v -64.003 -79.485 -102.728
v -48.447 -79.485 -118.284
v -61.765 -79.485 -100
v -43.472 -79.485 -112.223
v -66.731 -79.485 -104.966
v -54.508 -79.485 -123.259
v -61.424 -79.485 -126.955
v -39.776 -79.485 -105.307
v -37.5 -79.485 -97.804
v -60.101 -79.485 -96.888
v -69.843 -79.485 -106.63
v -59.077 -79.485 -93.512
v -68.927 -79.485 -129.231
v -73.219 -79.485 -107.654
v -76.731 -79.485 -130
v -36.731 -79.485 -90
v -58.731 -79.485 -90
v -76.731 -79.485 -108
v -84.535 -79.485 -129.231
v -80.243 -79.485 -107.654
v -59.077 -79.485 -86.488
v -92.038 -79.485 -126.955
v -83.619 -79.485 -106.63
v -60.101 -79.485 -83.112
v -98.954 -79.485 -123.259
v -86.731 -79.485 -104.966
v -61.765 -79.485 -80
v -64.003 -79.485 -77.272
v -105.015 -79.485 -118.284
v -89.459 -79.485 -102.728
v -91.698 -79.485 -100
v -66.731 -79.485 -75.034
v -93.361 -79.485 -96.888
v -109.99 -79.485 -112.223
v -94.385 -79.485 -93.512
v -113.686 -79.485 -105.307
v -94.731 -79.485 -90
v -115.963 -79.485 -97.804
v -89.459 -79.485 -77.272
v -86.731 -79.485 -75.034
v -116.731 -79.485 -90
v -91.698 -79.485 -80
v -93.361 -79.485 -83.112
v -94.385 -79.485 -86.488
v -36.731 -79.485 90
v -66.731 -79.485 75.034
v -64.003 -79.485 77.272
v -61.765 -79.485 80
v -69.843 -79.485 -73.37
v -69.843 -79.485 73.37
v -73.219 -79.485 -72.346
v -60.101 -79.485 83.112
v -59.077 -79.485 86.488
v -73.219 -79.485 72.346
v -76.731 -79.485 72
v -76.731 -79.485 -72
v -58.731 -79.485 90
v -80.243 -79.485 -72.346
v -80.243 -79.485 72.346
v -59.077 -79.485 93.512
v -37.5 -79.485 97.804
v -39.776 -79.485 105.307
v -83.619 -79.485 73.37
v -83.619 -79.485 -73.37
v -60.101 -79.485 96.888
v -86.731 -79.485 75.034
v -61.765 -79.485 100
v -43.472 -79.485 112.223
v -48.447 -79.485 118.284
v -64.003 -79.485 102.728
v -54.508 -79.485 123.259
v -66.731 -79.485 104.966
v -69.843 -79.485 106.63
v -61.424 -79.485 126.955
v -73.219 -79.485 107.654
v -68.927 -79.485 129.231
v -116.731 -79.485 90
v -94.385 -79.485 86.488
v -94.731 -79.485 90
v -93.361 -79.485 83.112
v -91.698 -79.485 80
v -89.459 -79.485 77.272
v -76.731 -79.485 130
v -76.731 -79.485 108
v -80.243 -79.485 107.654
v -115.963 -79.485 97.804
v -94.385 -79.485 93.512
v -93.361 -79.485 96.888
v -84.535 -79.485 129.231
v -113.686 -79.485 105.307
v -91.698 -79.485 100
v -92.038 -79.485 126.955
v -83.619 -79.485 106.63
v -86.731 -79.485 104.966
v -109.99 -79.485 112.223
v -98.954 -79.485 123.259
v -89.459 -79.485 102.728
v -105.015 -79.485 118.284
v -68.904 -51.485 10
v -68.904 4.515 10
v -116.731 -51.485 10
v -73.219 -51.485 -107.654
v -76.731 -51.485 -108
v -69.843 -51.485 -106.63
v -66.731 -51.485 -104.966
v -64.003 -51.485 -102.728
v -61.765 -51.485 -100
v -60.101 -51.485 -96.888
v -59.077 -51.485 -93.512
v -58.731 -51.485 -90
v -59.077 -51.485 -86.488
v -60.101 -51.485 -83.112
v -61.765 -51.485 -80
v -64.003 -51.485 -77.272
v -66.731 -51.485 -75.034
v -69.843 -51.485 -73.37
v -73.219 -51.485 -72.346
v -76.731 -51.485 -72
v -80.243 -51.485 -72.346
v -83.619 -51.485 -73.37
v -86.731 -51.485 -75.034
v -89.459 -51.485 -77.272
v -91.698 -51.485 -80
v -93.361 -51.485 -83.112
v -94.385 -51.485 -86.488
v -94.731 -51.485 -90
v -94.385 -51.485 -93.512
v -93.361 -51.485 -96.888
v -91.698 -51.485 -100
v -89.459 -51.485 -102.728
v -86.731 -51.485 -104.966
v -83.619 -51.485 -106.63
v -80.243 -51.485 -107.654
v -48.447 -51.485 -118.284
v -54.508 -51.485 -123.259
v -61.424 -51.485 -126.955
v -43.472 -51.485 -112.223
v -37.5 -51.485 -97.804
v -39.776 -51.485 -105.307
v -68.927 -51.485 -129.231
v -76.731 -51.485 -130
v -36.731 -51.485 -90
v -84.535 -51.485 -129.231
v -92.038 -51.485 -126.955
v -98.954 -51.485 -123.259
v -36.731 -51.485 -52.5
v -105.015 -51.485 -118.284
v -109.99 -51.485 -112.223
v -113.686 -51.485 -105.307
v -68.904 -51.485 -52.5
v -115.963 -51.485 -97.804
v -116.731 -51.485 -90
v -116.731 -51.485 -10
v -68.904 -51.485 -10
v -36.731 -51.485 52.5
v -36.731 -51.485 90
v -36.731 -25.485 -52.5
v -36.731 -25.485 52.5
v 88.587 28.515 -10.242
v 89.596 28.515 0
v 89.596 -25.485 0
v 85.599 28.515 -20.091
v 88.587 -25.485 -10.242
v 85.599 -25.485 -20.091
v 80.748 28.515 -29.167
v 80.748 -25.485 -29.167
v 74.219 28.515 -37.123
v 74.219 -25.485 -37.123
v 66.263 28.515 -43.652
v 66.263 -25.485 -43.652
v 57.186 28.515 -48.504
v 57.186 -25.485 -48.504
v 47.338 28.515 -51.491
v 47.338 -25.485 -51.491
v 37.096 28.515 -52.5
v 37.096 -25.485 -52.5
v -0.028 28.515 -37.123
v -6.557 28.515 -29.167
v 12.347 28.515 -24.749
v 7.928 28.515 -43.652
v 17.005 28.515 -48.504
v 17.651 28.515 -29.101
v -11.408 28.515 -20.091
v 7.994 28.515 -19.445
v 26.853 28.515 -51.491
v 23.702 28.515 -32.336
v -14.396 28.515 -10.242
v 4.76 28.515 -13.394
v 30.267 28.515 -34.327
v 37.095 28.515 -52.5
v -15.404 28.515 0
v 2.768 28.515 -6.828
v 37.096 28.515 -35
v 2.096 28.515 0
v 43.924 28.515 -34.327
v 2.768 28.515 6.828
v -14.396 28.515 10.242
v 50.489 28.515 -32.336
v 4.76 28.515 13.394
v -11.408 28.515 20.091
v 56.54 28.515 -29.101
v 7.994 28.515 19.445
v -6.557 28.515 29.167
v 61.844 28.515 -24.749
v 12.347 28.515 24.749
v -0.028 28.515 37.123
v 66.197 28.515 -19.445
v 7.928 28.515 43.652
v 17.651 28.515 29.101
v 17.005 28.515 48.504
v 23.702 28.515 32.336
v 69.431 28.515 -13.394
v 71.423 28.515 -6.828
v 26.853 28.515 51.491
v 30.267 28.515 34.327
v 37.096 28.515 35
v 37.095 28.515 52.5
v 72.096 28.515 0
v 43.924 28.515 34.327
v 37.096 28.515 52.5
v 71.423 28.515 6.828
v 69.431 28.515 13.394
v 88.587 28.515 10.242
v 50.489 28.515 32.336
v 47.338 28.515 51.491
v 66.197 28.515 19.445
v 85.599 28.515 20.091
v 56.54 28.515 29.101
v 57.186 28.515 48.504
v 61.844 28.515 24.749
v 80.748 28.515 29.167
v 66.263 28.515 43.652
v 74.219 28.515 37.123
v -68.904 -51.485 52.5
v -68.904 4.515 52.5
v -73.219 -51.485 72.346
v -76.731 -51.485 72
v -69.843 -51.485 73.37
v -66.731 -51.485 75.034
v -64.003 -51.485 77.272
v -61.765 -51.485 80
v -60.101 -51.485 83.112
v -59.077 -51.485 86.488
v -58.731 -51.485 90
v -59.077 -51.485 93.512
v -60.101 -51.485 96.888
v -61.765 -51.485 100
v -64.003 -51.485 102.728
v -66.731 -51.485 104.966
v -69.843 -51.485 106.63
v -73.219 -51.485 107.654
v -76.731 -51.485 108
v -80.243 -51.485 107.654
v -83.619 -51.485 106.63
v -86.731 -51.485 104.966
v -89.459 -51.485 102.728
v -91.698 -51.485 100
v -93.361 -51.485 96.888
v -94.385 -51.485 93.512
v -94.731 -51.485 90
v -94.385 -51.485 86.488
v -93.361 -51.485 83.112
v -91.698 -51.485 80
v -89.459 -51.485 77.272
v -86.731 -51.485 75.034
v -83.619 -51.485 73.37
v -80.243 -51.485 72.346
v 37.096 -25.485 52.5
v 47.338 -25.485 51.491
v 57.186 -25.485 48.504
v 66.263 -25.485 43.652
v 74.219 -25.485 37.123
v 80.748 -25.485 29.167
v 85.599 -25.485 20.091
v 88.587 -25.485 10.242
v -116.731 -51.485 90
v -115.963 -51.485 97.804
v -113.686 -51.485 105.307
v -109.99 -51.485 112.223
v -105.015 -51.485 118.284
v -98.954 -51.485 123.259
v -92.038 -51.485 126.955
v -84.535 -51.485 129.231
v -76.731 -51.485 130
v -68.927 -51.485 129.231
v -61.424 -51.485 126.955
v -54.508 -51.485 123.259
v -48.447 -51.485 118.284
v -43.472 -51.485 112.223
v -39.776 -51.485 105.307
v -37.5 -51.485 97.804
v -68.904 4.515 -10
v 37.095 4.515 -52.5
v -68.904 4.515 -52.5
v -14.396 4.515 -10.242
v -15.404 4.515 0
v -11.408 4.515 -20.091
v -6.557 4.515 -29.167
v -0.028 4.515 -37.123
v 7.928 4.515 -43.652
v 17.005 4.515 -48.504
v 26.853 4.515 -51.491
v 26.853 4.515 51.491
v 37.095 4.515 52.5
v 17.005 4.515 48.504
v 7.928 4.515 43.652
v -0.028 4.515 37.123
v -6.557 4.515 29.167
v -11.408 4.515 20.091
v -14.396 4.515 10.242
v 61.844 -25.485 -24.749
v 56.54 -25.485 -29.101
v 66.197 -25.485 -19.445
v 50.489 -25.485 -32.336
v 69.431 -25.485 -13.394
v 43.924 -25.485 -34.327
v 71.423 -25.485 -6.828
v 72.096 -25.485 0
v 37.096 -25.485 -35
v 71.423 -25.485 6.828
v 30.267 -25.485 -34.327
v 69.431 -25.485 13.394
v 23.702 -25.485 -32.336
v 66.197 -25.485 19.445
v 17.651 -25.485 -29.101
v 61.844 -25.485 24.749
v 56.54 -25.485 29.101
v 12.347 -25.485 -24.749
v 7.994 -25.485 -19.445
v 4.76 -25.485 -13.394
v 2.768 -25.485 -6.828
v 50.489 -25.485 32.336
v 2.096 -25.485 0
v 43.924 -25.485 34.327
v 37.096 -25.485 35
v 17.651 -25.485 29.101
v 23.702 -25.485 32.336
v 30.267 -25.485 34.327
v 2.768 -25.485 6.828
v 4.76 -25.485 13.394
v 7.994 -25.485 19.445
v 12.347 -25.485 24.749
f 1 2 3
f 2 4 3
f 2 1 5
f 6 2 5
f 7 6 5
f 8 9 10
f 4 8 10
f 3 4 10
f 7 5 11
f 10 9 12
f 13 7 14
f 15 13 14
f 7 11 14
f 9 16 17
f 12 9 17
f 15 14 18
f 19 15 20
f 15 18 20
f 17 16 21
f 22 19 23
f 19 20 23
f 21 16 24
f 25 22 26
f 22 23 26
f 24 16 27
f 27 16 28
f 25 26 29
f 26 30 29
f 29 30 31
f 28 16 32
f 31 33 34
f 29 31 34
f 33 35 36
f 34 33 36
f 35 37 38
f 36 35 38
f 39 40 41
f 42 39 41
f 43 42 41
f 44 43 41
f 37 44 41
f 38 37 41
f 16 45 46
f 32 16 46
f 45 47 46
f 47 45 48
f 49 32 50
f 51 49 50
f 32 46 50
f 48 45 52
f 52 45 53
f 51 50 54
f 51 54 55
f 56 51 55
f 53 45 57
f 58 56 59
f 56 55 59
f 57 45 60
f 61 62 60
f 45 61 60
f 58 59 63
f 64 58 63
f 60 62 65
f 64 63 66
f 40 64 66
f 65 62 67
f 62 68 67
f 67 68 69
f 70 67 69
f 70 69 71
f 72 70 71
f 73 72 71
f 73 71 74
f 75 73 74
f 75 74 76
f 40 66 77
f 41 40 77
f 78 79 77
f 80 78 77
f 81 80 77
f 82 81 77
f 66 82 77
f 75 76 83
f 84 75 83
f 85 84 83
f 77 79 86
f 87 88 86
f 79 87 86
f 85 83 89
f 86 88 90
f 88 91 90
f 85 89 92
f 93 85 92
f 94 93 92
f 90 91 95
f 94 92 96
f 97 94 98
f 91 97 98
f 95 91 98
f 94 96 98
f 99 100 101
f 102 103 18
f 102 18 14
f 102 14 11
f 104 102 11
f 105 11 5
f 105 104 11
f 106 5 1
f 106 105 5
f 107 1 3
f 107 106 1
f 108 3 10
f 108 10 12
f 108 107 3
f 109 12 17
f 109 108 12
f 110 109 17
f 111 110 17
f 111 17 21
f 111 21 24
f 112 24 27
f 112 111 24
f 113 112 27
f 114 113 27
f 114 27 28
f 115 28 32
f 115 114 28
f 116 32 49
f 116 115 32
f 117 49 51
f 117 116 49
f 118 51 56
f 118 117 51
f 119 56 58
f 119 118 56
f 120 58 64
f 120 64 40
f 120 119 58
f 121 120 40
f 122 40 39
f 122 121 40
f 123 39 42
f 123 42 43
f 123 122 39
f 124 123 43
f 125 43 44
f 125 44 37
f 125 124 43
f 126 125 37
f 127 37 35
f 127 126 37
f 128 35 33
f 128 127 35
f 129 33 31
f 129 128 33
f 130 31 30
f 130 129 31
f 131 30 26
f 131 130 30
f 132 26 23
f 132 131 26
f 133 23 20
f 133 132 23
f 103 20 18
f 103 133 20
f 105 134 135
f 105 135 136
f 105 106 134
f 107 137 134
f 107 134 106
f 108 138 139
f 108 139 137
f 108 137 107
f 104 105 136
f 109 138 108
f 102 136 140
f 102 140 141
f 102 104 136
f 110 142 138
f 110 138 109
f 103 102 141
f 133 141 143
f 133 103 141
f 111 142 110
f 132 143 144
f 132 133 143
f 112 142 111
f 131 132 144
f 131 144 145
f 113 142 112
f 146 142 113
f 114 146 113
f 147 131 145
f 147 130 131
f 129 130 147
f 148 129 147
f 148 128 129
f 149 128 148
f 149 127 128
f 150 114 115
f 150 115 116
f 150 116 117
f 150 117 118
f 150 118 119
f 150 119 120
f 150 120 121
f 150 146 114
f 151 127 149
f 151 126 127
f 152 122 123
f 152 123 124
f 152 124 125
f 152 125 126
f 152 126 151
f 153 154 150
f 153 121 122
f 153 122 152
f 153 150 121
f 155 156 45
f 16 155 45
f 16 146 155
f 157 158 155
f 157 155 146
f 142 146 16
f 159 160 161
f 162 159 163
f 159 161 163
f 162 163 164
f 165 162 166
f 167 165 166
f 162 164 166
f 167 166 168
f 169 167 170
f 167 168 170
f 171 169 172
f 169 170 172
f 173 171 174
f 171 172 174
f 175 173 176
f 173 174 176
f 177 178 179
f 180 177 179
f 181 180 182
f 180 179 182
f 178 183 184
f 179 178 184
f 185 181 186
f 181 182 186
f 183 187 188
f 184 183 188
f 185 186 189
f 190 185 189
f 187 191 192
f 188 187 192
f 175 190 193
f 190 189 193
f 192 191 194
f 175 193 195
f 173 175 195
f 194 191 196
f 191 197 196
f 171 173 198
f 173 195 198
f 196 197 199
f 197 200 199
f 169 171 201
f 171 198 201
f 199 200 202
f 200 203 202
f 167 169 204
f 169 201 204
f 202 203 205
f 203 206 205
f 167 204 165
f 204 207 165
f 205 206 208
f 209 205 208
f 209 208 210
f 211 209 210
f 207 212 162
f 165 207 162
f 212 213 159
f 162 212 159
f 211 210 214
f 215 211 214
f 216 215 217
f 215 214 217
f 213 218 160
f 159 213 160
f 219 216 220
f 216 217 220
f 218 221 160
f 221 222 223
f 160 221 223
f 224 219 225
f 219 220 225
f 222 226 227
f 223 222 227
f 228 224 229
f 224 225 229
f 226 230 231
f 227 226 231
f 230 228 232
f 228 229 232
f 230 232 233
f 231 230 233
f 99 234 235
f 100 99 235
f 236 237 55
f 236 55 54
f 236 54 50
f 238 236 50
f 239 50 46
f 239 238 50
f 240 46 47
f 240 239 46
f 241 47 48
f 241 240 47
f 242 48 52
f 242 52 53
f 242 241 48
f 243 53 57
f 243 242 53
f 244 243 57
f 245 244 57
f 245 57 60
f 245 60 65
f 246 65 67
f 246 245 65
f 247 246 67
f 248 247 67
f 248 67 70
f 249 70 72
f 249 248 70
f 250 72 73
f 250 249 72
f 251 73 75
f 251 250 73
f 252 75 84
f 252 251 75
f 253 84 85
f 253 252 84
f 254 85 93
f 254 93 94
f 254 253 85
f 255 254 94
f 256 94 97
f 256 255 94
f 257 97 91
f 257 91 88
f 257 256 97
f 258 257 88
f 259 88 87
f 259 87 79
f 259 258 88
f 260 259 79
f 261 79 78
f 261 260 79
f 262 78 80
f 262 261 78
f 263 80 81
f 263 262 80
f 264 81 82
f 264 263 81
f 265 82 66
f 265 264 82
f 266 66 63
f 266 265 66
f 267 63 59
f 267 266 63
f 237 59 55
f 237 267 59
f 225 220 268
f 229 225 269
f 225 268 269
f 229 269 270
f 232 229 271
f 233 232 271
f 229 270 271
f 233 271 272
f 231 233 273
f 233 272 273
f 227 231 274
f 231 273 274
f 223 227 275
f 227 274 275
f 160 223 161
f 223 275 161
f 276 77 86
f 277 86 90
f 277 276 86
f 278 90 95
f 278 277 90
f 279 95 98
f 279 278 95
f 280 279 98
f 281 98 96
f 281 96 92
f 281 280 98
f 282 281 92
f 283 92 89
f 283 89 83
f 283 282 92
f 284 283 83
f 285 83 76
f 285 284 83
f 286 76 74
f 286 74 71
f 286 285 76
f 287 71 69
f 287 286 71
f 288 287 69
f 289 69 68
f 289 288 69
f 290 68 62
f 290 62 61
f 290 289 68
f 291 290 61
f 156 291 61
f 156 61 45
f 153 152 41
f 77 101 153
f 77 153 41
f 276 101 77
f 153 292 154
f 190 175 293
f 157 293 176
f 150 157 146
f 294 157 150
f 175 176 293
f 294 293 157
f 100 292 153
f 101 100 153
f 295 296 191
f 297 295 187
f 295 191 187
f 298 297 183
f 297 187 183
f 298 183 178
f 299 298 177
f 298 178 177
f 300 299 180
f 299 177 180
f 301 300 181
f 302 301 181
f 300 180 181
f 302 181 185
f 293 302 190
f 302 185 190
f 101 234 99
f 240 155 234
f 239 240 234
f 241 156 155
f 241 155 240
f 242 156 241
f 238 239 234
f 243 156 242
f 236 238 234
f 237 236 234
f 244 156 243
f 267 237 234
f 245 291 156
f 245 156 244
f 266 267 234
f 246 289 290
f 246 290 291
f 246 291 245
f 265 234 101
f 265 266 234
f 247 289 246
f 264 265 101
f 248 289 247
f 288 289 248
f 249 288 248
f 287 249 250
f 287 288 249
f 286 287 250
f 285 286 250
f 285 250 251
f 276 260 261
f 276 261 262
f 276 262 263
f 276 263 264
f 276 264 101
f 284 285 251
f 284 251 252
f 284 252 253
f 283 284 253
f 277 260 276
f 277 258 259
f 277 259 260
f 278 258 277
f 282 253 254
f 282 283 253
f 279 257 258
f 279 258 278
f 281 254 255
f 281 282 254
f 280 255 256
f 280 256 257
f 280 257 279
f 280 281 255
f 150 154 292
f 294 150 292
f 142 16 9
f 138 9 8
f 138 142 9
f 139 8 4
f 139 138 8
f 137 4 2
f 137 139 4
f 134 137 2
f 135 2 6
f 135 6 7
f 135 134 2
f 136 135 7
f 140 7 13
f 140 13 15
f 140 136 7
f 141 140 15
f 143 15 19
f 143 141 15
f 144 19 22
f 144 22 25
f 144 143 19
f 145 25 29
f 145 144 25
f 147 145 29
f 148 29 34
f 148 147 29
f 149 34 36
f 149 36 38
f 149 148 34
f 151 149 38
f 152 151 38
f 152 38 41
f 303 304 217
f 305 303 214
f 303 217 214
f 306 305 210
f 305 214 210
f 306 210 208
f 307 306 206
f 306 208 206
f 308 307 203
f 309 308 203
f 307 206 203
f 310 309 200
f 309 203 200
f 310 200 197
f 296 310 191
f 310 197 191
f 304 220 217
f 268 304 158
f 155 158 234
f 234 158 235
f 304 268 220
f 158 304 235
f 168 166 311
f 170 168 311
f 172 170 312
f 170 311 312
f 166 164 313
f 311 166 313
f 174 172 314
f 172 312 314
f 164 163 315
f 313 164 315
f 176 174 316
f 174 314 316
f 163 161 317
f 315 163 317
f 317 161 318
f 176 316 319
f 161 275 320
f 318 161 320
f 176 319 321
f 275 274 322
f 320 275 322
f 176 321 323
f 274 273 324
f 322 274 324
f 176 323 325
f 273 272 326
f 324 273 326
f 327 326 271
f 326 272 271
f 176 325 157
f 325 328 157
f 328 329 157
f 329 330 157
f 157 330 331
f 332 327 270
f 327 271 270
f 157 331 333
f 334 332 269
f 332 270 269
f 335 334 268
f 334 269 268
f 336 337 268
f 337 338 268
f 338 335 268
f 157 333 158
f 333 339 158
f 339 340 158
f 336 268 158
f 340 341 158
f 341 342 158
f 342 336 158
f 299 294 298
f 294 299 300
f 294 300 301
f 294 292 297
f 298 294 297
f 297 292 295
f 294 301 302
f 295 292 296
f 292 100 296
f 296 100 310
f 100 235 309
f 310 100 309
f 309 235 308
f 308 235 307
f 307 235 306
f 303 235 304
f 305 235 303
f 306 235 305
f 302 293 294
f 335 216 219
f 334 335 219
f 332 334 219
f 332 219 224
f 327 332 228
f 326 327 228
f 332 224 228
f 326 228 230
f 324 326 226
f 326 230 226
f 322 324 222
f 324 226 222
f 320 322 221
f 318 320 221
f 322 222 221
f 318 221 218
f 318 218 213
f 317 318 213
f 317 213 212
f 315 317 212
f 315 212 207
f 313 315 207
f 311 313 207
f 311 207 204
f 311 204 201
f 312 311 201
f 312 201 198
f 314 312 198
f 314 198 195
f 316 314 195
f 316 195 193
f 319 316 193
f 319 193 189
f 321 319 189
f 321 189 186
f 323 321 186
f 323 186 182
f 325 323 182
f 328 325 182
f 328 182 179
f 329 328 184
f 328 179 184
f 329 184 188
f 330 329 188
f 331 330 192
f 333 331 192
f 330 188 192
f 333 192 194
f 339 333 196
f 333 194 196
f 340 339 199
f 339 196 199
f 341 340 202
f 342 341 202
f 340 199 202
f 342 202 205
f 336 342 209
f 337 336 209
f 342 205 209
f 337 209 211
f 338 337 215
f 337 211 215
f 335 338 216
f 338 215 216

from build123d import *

# Parameters (mm, degrees)
EXTRUDE_1_DEPTH     = 52.5
FILLET_1_R          = 52.5
SKETCH_2_R          = 35
CUT_EXTRUDE_1_DEPTH = 105
SKETCH_3_R          = 18
EXTRUDE_2_DEPTH     = 28
RIB_1_REACH         = 193.948
SKETCH_5_WALL_W     = 459.539721034
SKETCH_5_WALL_H     = 20


with BuildPart() as part:
    # 스케치1 → 보스-돌출1 (new, symmetric)
    with BuildSketch(Plane.XY):
        Polygon((-68.904487954, -51.485249183), (-68.904487954, 4.514750817), (-15.404487954, 4.514750817), (-15.404487954, 28.514750817), (89.595512046, 28.514750817), (89.595512046, -25.485249183), (-36.731091279, -25.485249183), (-36.731091279, -51.485249183), align=None)
    extrude(amount=EXTRUDE_1_DEPTH, both=True)

    # 필렛1
    fillet_1_edges = [part.edges().sort_by_distance(p)[0] for p in [
        (-15.404487954, 16.514750817, -52.5),
        (-15.404487954, 16.514750817, 52.5),
        (89.595512046, 1.514750817, 52.5),
        (89.595512046, 1.514750817, -52.5),
    ]]
    fillet(fillet_1_edges, radius=FILLET_1_R - 0.0001)  # a hair under: the kernel refuses the full size

    # 스케치2 → 컷-돌출1 (cut)
    with BuildSketch(Plane(origin=(0, 28.514750817, 0), x_dir=(1, 0, 0), z_dir=(0, 1, 0))):
        with Locations(Location((37.095512046, 0, 0), (0, 0, 270))):
            Circle(SKETCH_2_R)
    extrude(amount=-CUT_EXTRUDE_1_DEPTH, mode=Mode.SUBTRACT)

    # 스케치3 → 보스-돌출2 (add)
    with BuildSketch(Plane.XZ.offset(51.485249183)):
        with BuildLine():
            Line((-36.731091279, 90), (-36.731091279, -90))
            ThreePointArc((-36.731091279, -90), (-76.731091279, -130), (-116.731091279, -90))
            Line((-116.731091279, -90), (-116.731091279, 90))
            ThreePointArc((-116.731091279, 90), (-76.731091279, 130), (-36.731091279, 90))
        make_face()
        with Locations(Location((-76.731091279, 90, 0), (0, 0, 270))):
            Circle(SKETCH_3_R, mode=Mode.SUBTRACT)
        with Locations(Location((-76.731091279, -90, 0), (0, 0, 270))):
            Circle(SKETCH_3_R, mode=Mode.SUBTRACT)
    extrude(amount=EXTRUDE_2_DEPTH)

    # 스케치5 wall → 보강대1 (add, up to next)
    with BuildSketch(Plane(origin=(-92.817789616, -23.485249183, 0), x_dir=(-0.649433011991, -0.76041880759, 0), z_dir=(0.76041880759, -0.649433011991, 0)), mode=Mode.PRIVATE) as rib_1_sk1:
        Rectangle(SKETCH_5_WALL_W, SKETCH_5_WALL_H)
    rib_1_tool1 = extrude(rib_1_sk1.sketch, amount=RIB_1_REACH, mode=Mode.PRIVATE) - part.part
    add(rib_1_tool1.solids().sort_by_distance((-92.817789616, -23.485249183, 0))[0])


solid = part.part
